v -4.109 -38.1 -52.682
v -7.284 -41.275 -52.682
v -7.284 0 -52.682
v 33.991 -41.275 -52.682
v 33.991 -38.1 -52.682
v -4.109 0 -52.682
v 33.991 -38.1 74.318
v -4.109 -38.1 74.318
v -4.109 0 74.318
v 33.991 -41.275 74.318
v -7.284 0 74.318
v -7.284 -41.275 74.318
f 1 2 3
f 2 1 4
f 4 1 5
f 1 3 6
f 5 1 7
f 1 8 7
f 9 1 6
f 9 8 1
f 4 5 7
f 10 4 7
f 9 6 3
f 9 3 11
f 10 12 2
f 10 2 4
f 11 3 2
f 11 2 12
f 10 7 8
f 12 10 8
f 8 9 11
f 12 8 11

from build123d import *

# Parameters (mm, degrees)
F0_W     = 28.575
F0_H     = 31.75
F1_DEPTH = 1.5875
F3_DEPTH = 3.175
F4_W     = 38.1
F4_H     = 127
F4_W_2   = 3.175
F5_DEPTH = 3.175
F6_R     = 4
F6_R_2   = 1.85
F7_DEPTH = 25.4
F8_W     = 1.5875
F8_H     = 31.75
F9_DEPTH = 25.4


with BuildPart() as f1:
    # F0 (on Front) → F1 (new body)
    with BuildSketch(Plane.XZ):
        with Locations((-18.3960961165, 7.6425911009)):
            Rectangle(F0_W, F0_H)
    extrude(amount=F1_DEPTH)

    # F2 (on face) → F3 (join)
    with BuildSketch(Plane.YZ.offset(-4.1085961165)):
        Polygon((-38.1, -52.6824088991), (0, -52.6824088991), (0, -8.2324088991), (-1.5875, -8.2324088991), (-1.5875, 23.5175911009), (0, 23.5175911009), (0, 74.3175911009), (-38.1, 74.3175911009), align=None)
    extrude(amount=-F3_DEPTH)

    # F4 (on face) → F5 (join)
    with BuildSketch(Plane.XZ.offset(38.1)):
        with Locations((14.9414038835, 10.8175911009)):
            Rectangle(F4_W, F4_H)
        with Locations((-5.6960961165, 10.8175911009)):
            Rectangle(F4_W_2, F4_H)
    extrude(amount=F5_DEPTH)

    # F6 (on face) → F7 (cut)
    with BuildSketch(Plane.XZ.offset(1.5875)):
        with Locations((-16.6835961165, 7.6425911009)):
            Circle(F6_R)
        with Locations((-22.340450366, 13.2994453504)):
            Circle(F6_R_2)
        with Locations((-16.6835961165, 15.6425911009)):
            Circle(F6_R_2)
        with Locations((-11.026741867, 13.2994453504)):
            Circle(F6_R_2)
        with Locations((-11.026741867, 1.9857368514)):
            Circle(F6_R_2)
        with Locations((-16.6835961165, -0.3574088991)):
            Circle(F6_R_2)
        with Locations((-22.340450366, 1.9857368514)):
            Circle(F6_R_2)
        with Locations((-24.6835961165, 7.6425911009)):
            Circle(F6_R_2)
    extrude(amount=-F7_DEPTH, mode=Mode.SUBTRACT)

    # F8 (on face) → F9 (cut)
    with BuildSketch(Plane(origin=(-32.6835961165, 0, 0), x_dir=(0, -1, 0), z_dir=(-1, 0, 0))):
        with Locations((0.79375, 7.6425911009)):
            Rectangle(F8_W, F8_H)
    extrude(amount=-F9_DEPTH, mode=Mode.SUBTRACT)


solid = f1.part
